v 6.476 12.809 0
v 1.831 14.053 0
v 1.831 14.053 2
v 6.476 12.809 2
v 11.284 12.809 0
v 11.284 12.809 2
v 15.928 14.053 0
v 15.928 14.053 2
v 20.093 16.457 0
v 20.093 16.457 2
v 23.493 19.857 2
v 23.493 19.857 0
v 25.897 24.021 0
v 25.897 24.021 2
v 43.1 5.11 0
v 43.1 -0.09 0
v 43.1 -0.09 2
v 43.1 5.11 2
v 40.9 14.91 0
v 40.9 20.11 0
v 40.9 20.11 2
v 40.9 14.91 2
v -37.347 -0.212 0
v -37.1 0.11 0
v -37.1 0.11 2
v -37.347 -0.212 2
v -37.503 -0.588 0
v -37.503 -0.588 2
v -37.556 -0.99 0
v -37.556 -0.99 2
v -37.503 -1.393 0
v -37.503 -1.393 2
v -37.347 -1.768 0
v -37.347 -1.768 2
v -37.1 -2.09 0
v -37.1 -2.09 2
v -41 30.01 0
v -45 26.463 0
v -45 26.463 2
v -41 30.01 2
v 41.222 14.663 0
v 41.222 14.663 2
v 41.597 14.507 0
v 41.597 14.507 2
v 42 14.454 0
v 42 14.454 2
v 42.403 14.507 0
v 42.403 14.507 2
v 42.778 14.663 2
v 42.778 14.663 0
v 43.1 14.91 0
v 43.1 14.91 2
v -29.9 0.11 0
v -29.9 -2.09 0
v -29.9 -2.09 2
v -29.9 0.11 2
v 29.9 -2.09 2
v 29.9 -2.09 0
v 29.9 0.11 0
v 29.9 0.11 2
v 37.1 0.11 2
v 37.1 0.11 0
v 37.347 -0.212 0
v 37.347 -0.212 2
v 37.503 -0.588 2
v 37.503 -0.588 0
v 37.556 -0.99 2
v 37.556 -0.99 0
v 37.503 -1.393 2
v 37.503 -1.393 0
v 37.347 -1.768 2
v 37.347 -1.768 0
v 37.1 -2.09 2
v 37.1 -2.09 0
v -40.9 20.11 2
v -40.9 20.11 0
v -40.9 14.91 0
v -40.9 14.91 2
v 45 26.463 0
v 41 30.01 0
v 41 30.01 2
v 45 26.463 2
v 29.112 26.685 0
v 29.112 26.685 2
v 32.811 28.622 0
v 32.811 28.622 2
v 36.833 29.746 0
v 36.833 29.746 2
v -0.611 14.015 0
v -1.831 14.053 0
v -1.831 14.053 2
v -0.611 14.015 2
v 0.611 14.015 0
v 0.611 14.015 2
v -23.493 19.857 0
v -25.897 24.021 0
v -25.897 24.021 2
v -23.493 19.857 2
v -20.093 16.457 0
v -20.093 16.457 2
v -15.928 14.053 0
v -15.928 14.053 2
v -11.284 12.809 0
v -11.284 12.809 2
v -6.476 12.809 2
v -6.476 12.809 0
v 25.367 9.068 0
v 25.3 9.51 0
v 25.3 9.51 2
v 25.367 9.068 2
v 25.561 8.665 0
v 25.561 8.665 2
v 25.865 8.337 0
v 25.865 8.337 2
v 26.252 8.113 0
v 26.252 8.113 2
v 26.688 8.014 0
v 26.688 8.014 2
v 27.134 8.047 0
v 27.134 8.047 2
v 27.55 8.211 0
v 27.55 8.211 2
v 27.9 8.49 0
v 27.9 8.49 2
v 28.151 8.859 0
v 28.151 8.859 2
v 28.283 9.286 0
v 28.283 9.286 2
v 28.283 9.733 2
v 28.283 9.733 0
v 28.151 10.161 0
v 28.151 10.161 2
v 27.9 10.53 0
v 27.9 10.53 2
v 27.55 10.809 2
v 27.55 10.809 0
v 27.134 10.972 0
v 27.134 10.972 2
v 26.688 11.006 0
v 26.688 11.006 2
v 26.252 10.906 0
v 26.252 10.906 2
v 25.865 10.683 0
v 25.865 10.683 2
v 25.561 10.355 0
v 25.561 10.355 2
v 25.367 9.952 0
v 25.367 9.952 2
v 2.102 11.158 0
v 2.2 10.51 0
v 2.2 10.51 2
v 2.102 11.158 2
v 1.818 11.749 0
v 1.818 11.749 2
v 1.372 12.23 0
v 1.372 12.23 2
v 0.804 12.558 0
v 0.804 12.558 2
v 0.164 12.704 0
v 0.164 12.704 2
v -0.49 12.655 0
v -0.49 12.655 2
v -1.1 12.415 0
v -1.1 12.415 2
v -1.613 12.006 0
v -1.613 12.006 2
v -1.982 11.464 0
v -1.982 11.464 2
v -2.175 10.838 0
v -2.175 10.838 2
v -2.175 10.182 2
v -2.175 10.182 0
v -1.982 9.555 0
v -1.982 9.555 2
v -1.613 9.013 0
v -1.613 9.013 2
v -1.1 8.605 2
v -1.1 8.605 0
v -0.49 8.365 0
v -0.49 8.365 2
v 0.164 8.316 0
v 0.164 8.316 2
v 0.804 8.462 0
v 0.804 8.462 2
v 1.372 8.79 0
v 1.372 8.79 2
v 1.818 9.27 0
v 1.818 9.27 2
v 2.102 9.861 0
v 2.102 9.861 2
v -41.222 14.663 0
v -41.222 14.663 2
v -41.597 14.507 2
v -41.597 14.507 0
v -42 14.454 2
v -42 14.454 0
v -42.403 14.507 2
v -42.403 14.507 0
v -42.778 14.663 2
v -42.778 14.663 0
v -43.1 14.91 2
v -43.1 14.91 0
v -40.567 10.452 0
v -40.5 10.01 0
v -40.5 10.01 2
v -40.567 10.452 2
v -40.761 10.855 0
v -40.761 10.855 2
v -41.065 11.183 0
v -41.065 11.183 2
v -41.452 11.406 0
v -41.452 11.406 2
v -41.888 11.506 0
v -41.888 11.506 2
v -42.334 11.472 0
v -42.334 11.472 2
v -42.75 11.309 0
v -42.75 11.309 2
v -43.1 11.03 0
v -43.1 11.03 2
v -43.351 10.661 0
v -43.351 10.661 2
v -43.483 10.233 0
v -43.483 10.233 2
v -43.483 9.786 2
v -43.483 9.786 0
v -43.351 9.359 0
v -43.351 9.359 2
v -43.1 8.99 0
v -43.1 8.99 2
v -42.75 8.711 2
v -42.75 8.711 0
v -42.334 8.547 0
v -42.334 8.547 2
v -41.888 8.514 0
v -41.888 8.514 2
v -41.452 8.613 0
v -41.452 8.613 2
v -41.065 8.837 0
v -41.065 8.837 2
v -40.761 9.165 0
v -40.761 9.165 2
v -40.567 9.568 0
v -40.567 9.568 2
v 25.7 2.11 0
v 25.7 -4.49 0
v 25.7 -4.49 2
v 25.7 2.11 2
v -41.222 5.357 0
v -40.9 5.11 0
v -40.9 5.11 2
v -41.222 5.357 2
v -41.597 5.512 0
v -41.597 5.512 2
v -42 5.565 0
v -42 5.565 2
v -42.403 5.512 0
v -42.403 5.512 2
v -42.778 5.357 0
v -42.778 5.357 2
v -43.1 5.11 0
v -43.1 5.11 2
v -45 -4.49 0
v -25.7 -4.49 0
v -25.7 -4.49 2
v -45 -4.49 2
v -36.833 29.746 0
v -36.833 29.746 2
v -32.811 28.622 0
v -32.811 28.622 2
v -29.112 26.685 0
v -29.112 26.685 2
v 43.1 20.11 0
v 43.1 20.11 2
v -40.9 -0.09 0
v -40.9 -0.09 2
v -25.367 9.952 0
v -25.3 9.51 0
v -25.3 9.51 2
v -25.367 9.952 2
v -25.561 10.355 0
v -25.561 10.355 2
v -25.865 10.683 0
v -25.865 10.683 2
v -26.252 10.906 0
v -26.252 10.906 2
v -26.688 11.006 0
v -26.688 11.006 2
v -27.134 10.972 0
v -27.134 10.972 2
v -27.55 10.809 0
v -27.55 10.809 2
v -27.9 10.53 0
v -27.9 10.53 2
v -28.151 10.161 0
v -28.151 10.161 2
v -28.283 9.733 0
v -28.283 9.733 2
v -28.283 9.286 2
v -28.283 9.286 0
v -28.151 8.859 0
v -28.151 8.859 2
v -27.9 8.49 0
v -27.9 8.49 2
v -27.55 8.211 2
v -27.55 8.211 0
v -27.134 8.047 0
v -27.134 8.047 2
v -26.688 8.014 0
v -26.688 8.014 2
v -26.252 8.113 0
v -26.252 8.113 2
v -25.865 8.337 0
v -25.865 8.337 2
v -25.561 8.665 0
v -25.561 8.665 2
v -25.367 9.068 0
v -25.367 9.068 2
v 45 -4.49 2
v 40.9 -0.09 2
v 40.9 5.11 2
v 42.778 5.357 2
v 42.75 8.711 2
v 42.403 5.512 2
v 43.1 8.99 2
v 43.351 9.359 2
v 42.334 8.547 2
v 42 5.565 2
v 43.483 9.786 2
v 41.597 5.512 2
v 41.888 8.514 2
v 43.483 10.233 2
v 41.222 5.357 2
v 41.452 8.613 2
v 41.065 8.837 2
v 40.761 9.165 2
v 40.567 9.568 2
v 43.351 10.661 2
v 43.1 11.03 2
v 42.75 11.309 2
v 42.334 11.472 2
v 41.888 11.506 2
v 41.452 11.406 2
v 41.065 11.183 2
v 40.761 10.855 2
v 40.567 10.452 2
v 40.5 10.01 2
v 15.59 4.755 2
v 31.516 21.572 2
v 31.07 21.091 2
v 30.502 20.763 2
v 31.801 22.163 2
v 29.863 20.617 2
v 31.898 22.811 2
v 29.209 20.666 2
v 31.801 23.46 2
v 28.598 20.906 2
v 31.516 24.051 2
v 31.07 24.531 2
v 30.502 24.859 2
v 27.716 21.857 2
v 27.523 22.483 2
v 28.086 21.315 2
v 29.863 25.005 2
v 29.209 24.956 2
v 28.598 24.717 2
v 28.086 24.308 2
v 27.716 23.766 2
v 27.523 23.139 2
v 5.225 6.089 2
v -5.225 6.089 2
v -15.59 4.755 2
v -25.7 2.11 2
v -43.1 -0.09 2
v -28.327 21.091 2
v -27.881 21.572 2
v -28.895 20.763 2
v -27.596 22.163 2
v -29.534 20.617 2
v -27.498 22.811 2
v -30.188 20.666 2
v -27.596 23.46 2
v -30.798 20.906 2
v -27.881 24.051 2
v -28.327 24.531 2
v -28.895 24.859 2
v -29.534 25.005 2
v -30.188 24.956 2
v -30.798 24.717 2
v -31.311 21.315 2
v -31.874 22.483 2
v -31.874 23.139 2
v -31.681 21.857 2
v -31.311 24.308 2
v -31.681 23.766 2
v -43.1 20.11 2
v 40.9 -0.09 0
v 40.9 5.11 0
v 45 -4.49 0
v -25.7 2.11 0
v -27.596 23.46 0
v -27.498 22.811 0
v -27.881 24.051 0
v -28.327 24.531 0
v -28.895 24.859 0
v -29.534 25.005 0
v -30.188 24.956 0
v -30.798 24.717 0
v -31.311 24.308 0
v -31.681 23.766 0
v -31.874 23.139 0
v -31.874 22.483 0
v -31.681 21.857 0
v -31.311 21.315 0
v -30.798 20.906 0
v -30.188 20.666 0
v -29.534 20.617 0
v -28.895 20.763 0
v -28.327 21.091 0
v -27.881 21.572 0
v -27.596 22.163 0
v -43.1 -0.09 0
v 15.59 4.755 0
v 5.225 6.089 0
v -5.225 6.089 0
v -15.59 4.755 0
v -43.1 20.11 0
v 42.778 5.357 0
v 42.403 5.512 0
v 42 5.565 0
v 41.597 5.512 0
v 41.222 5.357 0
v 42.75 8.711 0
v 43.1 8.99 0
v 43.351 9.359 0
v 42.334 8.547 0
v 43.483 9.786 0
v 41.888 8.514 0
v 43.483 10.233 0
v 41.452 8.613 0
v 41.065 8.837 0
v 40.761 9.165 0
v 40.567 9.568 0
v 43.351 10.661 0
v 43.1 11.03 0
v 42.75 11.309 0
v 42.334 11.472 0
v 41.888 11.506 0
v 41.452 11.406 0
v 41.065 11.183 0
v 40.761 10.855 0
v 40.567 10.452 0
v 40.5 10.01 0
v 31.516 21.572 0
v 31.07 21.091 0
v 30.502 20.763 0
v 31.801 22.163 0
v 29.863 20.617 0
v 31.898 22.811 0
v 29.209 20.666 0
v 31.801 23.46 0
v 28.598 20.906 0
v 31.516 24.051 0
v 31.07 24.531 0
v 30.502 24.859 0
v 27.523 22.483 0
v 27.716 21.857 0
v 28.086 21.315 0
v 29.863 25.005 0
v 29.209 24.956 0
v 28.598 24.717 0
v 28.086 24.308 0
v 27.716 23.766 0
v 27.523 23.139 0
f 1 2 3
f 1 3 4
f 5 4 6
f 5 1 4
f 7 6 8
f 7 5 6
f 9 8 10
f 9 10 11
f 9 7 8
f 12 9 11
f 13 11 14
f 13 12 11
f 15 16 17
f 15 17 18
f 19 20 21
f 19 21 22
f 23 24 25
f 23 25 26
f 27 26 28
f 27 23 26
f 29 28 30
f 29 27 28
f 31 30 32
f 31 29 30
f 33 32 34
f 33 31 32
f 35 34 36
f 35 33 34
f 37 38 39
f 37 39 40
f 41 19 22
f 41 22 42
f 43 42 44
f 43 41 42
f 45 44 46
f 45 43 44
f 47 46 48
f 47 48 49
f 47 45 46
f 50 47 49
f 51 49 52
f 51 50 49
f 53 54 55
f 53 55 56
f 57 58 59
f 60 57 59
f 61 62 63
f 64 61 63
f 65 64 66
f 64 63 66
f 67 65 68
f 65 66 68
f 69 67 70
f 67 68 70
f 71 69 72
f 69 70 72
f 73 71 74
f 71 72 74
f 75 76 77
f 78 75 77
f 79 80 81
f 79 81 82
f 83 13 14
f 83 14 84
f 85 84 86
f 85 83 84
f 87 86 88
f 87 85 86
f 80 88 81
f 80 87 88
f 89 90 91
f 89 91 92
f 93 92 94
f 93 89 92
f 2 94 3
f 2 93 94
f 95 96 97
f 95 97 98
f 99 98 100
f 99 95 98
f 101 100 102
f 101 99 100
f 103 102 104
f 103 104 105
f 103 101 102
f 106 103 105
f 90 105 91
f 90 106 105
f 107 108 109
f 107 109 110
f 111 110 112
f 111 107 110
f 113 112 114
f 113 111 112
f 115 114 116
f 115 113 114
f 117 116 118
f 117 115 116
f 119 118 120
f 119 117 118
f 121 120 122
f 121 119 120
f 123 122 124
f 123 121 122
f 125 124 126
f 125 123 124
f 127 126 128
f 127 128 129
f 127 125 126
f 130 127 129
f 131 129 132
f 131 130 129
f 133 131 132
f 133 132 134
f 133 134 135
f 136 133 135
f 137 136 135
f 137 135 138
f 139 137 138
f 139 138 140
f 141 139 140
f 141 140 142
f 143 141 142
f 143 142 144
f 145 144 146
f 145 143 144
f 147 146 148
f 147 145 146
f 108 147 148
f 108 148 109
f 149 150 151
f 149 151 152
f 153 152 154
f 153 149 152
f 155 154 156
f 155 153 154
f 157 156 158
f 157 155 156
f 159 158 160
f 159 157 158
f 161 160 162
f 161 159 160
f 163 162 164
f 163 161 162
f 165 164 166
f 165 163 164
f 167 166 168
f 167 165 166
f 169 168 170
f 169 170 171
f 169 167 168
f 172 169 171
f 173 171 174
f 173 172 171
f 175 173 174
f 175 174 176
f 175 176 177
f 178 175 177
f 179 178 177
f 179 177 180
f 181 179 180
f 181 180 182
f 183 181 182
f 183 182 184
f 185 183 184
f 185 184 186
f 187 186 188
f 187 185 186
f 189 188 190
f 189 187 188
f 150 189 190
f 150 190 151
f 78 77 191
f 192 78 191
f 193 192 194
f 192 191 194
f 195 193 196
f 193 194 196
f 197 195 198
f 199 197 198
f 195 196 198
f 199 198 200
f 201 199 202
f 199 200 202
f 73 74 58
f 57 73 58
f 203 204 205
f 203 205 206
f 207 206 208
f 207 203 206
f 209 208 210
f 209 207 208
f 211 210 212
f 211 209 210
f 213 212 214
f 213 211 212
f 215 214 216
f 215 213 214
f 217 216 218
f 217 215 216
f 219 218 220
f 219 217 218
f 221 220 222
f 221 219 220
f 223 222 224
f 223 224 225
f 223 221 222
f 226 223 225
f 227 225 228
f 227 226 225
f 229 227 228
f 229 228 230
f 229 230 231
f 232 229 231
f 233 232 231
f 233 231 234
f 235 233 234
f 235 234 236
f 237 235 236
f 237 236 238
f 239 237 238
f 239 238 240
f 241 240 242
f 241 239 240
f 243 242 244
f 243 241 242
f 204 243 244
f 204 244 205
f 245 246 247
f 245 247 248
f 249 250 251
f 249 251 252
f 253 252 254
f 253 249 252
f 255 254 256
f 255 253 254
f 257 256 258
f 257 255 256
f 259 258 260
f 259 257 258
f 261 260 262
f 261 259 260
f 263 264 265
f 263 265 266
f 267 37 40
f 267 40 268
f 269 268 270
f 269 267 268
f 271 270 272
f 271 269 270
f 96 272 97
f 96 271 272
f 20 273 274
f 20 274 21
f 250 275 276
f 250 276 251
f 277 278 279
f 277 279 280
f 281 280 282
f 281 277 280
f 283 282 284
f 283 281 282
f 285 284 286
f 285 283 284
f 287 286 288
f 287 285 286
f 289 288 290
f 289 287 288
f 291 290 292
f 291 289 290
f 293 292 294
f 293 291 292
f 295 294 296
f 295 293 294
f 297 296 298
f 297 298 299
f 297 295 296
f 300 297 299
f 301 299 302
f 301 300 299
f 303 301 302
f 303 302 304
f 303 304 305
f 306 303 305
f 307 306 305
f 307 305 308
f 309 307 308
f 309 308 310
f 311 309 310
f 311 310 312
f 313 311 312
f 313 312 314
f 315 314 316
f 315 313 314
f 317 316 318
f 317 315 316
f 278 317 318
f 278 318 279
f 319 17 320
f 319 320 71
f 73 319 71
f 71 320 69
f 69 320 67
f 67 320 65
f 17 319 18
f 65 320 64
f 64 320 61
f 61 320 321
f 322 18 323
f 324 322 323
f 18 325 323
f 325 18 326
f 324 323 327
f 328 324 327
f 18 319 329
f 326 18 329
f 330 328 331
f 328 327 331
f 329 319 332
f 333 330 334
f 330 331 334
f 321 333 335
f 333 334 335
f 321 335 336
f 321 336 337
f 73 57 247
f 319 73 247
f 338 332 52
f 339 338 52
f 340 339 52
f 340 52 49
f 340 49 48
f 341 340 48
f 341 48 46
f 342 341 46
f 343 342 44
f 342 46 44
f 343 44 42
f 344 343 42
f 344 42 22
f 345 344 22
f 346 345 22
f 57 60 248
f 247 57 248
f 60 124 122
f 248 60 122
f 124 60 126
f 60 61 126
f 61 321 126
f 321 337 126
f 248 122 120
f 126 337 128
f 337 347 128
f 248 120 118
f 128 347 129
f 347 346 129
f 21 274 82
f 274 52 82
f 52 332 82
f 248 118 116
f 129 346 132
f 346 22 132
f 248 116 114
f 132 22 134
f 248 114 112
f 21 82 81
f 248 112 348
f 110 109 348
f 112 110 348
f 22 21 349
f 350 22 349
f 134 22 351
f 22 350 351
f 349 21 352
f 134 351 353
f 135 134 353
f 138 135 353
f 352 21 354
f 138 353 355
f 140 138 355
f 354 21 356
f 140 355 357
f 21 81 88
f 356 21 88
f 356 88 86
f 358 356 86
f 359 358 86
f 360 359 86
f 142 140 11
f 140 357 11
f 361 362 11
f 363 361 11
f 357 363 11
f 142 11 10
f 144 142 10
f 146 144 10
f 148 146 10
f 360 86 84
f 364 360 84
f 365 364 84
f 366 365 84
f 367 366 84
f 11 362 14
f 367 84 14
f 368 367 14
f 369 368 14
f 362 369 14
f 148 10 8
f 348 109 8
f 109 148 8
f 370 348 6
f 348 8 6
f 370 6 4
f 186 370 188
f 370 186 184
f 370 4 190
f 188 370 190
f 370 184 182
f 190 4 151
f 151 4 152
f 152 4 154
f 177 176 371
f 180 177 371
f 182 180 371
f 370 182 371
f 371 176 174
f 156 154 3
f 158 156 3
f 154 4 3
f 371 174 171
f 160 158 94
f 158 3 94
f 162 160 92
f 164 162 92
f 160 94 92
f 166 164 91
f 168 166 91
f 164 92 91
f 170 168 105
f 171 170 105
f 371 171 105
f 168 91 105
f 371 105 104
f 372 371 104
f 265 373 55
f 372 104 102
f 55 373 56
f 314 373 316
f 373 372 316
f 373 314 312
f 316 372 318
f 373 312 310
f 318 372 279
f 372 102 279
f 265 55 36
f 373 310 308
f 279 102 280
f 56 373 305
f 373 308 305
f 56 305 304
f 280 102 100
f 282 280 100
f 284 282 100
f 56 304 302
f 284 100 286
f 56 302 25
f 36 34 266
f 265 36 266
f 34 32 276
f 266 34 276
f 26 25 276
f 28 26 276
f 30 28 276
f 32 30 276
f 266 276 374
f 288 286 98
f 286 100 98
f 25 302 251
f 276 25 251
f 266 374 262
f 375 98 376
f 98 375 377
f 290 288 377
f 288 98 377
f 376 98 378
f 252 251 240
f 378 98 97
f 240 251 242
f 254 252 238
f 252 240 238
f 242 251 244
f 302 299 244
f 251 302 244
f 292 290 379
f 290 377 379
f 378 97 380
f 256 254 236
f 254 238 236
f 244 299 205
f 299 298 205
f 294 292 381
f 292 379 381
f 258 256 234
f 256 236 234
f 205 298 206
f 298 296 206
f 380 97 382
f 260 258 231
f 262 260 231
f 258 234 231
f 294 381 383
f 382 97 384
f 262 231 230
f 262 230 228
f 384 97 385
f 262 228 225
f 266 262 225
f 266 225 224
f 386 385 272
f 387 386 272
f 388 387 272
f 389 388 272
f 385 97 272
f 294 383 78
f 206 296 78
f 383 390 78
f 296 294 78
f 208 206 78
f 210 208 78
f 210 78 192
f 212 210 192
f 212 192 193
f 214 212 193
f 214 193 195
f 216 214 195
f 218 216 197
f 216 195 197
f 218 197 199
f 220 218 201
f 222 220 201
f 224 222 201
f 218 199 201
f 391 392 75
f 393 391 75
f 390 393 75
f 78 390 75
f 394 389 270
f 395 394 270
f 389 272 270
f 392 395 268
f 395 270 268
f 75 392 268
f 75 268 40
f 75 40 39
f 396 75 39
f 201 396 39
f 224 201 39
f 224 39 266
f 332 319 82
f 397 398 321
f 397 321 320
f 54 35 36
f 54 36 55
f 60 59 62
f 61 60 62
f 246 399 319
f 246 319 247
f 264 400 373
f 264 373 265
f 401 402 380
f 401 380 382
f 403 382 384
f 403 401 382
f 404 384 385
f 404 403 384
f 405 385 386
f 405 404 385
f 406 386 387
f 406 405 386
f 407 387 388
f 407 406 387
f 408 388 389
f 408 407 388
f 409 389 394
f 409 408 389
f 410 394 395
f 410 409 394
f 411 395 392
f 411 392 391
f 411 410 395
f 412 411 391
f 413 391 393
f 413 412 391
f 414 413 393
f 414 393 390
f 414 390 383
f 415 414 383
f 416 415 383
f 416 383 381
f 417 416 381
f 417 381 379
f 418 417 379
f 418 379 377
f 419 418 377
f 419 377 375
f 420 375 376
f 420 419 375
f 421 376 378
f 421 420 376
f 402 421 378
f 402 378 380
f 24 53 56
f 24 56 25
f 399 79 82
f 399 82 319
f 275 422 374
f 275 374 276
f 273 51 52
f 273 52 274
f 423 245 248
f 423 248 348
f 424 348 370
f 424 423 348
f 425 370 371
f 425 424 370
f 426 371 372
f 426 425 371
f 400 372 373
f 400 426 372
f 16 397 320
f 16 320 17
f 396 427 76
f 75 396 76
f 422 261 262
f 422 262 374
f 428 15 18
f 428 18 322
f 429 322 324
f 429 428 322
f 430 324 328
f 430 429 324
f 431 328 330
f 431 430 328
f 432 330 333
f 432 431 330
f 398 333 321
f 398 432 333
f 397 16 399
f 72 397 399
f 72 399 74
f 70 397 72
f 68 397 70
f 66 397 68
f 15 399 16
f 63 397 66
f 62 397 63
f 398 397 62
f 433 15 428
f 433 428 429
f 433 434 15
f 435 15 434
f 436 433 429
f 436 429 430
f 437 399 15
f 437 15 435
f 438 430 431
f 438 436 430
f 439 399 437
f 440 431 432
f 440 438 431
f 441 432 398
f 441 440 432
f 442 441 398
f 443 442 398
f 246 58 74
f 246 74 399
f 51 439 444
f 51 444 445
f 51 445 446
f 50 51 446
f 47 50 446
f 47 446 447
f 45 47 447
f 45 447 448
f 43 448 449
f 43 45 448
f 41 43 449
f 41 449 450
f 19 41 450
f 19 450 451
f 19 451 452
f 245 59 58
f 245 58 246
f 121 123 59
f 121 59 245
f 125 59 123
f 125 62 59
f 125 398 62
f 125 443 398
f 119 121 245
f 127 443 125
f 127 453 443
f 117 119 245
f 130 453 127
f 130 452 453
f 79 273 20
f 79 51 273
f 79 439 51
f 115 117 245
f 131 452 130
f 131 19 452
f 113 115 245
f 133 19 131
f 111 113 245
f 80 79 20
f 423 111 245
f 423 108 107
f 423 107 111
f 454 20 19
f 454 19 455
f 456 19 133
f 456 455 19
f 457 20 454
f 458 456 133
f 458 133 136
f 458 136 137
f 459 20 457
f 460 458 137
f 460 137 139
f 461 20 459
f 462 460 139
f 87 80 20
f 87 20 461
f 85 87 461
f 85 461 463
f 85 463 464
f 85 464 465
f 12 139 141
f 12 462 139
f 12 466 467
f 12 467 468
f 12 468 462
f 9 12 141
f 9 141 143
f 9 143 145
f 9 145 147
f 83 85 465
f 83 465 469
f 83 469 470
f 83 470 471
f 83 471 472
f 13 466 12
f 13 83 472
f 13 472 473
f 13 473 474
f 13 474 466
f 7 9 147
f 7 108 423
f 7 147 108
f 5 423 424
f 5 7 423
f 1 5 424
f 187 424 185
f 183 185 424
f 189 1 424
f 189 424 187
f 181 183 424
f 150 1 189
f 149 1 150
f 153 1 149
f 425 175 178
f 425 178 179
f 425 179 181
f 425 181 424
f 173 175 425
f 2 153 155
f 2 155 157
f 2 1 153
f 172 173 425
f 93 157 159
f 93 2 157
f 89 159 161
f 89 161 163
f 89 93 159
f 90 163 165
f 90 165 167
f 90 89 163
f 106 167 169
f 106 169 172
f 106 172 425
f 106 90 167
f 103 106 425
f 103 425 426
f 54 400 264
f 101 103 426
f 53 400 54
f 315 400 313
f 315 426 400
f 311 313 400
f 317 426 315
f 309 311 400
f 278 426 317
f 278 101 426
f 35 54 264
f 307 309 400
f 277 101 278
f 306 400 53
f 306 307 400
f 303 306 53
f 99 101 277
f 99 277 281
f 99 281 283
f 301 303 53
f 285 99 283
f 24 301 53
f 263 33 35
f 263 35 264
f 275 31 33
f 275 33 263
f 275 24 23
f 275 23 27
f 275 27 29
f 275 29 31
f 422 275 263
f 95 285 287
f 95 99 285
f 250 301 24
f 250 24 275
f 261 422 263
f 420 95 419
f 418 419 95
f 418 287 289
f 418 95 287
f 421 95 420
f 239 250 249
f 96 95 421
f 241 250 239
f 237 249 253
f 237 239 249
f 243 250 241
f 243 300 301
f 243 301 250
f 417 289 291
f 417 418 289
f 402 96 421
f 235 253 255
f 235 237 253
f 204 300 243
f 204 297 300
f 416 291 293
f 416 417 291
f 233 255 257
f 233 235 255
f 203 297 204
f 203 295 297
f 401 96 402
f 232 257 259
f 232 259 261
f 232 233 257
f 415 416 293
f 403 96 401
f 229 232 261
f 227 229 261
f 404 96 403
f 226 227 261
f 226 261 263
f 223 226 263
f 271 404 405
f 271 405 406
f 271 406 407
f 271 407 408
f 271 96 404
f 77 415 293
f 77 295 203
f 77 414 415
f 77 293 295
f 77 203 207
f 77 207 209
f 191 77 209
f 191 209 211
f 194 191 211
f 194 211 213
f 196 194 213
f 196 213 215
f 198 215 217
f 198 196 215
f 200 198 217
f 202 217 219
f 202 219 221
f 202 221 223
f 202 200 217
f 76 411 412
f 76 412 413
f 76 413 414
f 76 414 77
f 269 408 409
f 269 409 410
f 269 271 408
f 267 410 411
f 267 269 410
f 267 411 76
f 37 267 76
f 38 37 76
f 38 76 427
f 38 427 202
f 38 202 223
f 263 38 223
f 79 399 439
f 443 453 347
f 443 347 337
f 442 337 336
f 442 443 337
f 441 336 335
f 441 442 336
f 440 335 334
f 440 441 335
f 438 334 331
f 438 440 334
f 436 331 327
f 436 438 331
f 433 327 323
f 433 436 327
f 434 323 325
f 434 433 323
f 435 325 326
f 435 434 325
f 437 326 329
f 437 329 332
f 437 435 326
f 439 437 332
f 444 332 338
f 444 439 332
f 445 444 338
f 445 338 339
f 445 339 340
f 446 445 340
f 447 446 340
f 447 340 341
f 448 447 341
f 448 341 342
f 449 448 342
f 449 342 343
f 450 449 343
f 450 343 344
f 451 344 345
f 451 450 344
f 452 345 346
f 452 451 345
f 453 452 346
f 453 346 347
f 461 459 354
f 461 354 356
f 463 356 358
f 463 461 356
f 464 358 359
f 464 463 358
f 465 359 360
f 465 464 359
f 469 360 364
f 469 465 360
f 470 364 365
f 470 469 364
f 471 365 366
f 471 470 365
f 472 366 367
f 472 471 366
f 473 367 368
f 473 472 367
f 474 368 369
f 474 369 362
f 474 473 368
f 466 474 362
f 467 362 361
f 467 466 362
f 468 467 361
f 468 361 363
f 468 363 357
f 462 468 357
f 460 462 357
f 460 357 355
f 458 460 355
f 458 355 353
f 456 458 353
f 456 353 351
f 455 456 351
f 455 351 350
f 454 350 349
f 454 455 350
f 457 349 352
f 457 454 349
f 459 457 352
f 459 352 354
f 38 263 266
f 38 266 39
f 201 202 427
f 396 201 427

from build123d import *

# Parameters (mm, degrees)
SKETCH_3_R      = 2.2
SKETCH_3_R_2    = 1.5
EXTRUDE_1_DEPTH = 2


with BuildPart() as part:
    # 草图3 → 凸台-拉伸1 (new body)
    with BuildSketch(Plane.XY):
        with BuildLine():
            Line((-41, -4.490216685), (-42, -4.490216685))
            Line((-42, -4.490216685), (-44, -4.490216685))
            Line((-44, -4.490216685), (-45, -4.490216685))
            Line((-45, -4.490216685), (-45, 4.509783315))
            Line((-45, 4.509783315), (-45, 14.509783315))
            Line((-45, 14.509783315), (-45, 26.463053661))
            Line((-45, 26.463053661), (-41, 30.009783315))
            ThreePointArc((-41, 30.009783315), (-32.811469568, 28.6216516), (-25.896750373, 24.021043081))
            ThreePointArc((-25.896750373, 24.021043081), (-15.928379069, 14.053074936), (-1.831258252, 14.053360012))
            ThreePointArc((-1.831258252, 14.053360012), (0, 14.009783315), (1.831258252, 14.053360012))
            ThreePointArc((1.831258252, 14.053360012), (15.928379069, 14.053074936), (25.896750373, 24.021043081))
            ThreePointArc((25.896750373, 24.021043081), (32.811469568, 28.6216516), (41, 30.009783315))
            Line((41, 30.009783315), (45, 26.463053661))
            Line((45, 26.463053661), (45, 14.509783315))
            Line((45, 14.509783315), (45, 4.509783315))
            Line((45, 4.509783315), (45, -4.490216685))
            Line((45, -4.490216685), (41, -4.490216685))
            Line((41, -4.490216685), (25.7, -4.490216685))
            Line((25.7, -4.490216685), (25.7, -0.390216685))
            Line((25.7, -0.390216685), (25.7, 2.109783315))
            ThreePointArc((25.7, 2.109783315), (0, 6.256082772), (-25.7, 2.109783315))
            Line((-25.7, 2.109783315), (-25.7, -0.390216685))
            Line((-25.7, -0.390216685), (-25.7, -4.490216685))
            Line((-25.7, -4.490216685), (-41, -4.490216685))
        make_face()
        with Locations((0, 10.509783315)):
            Circle(SKETCH_3_R, mode=Mode.SUBTRACT)
        with Locations((-29.69848481, 22.811298505)):
            Circle(SKETCH_3_R, mode=Mode.SUBTRACT)
        with Locations((-26.8, 9.509783315)):
            Circle(SKETCH_3_R_2, mode=Mode.SUBTRACT)
        with Locations(Location((26.8, 9.509783315, 0), (0, 0, 180))):
            Circle(SKETCH_3_R_2, mode=Mode.SUBTRACT)
        with Locations((-42, 10.009783315)):
            Circle(SKETCH_3_R_2, mode=Mode.SUBTRACT)
        with Locations(Location((42, 10.009783315, 0), (0, 0, 180))):
            Circle(SKETCH_3_R_2, mode=Mode.SUBTRACT)
        with Locations((29.69848481, 22.811298505)):
            Circle(SKETCH_3_R, mode=Mode.SUBTRACT)
        with BuildLine():
            Line((-37.1, -2.090216685), (-29.9, -2.090216685))
            Line((-29.9, -2.090216685), (-29.9, 0.109783315))
            Line((-29.9, 0.109783315), (-37.1, 0.109783315))
            ThreePointArc((-37.1, 0.109783315), (-37.555634919, -0.990216685), (-37.1, -2.090216685))
        make_face(mode=Mode.SUBTRACT)
        with BuildLine():
            Line((29.9, -2.090216685), (29.9, 0.109783315))
            Line((29.9, 0.109783315), (37.1, 0.109783315))
            ThreePointArc((37.1, 0.109783315), (37.555634919, -0.990216685), (37.1, -2.090216685))
            Line((37.1, -2.090216685), (29.9, -2.090216685))
        make_face(mode=Mode.SUBTRACT)
        with BuildLine():
            Line((-43.1, 5.109783315), (-43.1, -0.090216685))
            Line((-43.1, -0.090216685), (-40.9, -0.090216685))
            Line((-40.9, -0.090216685), (-40.9, 5.109783315))
            ThreePointArc((-40.9, 5.109783315), (-42, 5.565418233), (-43.1, 5.109783315))
        make_face(mode=Mode.SUBTRACT)
        with BuildLine():
            Line((-43.1, 20.109783315), (-40.9, 20.109783315))
            Line((-40.9, 20.109783315), (-40.9, 14.909783315))
            ThreePointArc((-40.9, 14.909783315), (-42, 14.454148396), (-43.1, 14.909783315))
            Line((-43.1, 14.909783315), (-43.1, 20.109783315))
        make_face(mode=Mode.SUBTRACT)
        with BuildLine():
            Line((40.9, 20.109783315), (40.9, 14.909783315))
            ThreePointArc((40.9, 14.909783315), (42, 14.454148396), (43.1, 14.909783315))
            Line((43.1, 14.909783315), (43.1, 20.109783315))
            Line((43.1, 20.109783315), (40.9, 20.109783315))
        make_face(mode=Mode.SUBTRACT)
        with BuildLine():
            Line((40.9, 5.109783315), (40.9, -0.090216685))
            Line((40.9, -0.090216685), (43.1, -0.090216685))
            Line((43.1, -0.090216685), (43.1, 5.109783315))
            ThreePointArc((43.1, 5.109783315), (42, 5.565418233), (40.9, 5.109783315))
        make_face(mode=Mode.SUBTRACT)
    extrude(amount=EXTRUDE_1_DEPTH)


solid = part.part
